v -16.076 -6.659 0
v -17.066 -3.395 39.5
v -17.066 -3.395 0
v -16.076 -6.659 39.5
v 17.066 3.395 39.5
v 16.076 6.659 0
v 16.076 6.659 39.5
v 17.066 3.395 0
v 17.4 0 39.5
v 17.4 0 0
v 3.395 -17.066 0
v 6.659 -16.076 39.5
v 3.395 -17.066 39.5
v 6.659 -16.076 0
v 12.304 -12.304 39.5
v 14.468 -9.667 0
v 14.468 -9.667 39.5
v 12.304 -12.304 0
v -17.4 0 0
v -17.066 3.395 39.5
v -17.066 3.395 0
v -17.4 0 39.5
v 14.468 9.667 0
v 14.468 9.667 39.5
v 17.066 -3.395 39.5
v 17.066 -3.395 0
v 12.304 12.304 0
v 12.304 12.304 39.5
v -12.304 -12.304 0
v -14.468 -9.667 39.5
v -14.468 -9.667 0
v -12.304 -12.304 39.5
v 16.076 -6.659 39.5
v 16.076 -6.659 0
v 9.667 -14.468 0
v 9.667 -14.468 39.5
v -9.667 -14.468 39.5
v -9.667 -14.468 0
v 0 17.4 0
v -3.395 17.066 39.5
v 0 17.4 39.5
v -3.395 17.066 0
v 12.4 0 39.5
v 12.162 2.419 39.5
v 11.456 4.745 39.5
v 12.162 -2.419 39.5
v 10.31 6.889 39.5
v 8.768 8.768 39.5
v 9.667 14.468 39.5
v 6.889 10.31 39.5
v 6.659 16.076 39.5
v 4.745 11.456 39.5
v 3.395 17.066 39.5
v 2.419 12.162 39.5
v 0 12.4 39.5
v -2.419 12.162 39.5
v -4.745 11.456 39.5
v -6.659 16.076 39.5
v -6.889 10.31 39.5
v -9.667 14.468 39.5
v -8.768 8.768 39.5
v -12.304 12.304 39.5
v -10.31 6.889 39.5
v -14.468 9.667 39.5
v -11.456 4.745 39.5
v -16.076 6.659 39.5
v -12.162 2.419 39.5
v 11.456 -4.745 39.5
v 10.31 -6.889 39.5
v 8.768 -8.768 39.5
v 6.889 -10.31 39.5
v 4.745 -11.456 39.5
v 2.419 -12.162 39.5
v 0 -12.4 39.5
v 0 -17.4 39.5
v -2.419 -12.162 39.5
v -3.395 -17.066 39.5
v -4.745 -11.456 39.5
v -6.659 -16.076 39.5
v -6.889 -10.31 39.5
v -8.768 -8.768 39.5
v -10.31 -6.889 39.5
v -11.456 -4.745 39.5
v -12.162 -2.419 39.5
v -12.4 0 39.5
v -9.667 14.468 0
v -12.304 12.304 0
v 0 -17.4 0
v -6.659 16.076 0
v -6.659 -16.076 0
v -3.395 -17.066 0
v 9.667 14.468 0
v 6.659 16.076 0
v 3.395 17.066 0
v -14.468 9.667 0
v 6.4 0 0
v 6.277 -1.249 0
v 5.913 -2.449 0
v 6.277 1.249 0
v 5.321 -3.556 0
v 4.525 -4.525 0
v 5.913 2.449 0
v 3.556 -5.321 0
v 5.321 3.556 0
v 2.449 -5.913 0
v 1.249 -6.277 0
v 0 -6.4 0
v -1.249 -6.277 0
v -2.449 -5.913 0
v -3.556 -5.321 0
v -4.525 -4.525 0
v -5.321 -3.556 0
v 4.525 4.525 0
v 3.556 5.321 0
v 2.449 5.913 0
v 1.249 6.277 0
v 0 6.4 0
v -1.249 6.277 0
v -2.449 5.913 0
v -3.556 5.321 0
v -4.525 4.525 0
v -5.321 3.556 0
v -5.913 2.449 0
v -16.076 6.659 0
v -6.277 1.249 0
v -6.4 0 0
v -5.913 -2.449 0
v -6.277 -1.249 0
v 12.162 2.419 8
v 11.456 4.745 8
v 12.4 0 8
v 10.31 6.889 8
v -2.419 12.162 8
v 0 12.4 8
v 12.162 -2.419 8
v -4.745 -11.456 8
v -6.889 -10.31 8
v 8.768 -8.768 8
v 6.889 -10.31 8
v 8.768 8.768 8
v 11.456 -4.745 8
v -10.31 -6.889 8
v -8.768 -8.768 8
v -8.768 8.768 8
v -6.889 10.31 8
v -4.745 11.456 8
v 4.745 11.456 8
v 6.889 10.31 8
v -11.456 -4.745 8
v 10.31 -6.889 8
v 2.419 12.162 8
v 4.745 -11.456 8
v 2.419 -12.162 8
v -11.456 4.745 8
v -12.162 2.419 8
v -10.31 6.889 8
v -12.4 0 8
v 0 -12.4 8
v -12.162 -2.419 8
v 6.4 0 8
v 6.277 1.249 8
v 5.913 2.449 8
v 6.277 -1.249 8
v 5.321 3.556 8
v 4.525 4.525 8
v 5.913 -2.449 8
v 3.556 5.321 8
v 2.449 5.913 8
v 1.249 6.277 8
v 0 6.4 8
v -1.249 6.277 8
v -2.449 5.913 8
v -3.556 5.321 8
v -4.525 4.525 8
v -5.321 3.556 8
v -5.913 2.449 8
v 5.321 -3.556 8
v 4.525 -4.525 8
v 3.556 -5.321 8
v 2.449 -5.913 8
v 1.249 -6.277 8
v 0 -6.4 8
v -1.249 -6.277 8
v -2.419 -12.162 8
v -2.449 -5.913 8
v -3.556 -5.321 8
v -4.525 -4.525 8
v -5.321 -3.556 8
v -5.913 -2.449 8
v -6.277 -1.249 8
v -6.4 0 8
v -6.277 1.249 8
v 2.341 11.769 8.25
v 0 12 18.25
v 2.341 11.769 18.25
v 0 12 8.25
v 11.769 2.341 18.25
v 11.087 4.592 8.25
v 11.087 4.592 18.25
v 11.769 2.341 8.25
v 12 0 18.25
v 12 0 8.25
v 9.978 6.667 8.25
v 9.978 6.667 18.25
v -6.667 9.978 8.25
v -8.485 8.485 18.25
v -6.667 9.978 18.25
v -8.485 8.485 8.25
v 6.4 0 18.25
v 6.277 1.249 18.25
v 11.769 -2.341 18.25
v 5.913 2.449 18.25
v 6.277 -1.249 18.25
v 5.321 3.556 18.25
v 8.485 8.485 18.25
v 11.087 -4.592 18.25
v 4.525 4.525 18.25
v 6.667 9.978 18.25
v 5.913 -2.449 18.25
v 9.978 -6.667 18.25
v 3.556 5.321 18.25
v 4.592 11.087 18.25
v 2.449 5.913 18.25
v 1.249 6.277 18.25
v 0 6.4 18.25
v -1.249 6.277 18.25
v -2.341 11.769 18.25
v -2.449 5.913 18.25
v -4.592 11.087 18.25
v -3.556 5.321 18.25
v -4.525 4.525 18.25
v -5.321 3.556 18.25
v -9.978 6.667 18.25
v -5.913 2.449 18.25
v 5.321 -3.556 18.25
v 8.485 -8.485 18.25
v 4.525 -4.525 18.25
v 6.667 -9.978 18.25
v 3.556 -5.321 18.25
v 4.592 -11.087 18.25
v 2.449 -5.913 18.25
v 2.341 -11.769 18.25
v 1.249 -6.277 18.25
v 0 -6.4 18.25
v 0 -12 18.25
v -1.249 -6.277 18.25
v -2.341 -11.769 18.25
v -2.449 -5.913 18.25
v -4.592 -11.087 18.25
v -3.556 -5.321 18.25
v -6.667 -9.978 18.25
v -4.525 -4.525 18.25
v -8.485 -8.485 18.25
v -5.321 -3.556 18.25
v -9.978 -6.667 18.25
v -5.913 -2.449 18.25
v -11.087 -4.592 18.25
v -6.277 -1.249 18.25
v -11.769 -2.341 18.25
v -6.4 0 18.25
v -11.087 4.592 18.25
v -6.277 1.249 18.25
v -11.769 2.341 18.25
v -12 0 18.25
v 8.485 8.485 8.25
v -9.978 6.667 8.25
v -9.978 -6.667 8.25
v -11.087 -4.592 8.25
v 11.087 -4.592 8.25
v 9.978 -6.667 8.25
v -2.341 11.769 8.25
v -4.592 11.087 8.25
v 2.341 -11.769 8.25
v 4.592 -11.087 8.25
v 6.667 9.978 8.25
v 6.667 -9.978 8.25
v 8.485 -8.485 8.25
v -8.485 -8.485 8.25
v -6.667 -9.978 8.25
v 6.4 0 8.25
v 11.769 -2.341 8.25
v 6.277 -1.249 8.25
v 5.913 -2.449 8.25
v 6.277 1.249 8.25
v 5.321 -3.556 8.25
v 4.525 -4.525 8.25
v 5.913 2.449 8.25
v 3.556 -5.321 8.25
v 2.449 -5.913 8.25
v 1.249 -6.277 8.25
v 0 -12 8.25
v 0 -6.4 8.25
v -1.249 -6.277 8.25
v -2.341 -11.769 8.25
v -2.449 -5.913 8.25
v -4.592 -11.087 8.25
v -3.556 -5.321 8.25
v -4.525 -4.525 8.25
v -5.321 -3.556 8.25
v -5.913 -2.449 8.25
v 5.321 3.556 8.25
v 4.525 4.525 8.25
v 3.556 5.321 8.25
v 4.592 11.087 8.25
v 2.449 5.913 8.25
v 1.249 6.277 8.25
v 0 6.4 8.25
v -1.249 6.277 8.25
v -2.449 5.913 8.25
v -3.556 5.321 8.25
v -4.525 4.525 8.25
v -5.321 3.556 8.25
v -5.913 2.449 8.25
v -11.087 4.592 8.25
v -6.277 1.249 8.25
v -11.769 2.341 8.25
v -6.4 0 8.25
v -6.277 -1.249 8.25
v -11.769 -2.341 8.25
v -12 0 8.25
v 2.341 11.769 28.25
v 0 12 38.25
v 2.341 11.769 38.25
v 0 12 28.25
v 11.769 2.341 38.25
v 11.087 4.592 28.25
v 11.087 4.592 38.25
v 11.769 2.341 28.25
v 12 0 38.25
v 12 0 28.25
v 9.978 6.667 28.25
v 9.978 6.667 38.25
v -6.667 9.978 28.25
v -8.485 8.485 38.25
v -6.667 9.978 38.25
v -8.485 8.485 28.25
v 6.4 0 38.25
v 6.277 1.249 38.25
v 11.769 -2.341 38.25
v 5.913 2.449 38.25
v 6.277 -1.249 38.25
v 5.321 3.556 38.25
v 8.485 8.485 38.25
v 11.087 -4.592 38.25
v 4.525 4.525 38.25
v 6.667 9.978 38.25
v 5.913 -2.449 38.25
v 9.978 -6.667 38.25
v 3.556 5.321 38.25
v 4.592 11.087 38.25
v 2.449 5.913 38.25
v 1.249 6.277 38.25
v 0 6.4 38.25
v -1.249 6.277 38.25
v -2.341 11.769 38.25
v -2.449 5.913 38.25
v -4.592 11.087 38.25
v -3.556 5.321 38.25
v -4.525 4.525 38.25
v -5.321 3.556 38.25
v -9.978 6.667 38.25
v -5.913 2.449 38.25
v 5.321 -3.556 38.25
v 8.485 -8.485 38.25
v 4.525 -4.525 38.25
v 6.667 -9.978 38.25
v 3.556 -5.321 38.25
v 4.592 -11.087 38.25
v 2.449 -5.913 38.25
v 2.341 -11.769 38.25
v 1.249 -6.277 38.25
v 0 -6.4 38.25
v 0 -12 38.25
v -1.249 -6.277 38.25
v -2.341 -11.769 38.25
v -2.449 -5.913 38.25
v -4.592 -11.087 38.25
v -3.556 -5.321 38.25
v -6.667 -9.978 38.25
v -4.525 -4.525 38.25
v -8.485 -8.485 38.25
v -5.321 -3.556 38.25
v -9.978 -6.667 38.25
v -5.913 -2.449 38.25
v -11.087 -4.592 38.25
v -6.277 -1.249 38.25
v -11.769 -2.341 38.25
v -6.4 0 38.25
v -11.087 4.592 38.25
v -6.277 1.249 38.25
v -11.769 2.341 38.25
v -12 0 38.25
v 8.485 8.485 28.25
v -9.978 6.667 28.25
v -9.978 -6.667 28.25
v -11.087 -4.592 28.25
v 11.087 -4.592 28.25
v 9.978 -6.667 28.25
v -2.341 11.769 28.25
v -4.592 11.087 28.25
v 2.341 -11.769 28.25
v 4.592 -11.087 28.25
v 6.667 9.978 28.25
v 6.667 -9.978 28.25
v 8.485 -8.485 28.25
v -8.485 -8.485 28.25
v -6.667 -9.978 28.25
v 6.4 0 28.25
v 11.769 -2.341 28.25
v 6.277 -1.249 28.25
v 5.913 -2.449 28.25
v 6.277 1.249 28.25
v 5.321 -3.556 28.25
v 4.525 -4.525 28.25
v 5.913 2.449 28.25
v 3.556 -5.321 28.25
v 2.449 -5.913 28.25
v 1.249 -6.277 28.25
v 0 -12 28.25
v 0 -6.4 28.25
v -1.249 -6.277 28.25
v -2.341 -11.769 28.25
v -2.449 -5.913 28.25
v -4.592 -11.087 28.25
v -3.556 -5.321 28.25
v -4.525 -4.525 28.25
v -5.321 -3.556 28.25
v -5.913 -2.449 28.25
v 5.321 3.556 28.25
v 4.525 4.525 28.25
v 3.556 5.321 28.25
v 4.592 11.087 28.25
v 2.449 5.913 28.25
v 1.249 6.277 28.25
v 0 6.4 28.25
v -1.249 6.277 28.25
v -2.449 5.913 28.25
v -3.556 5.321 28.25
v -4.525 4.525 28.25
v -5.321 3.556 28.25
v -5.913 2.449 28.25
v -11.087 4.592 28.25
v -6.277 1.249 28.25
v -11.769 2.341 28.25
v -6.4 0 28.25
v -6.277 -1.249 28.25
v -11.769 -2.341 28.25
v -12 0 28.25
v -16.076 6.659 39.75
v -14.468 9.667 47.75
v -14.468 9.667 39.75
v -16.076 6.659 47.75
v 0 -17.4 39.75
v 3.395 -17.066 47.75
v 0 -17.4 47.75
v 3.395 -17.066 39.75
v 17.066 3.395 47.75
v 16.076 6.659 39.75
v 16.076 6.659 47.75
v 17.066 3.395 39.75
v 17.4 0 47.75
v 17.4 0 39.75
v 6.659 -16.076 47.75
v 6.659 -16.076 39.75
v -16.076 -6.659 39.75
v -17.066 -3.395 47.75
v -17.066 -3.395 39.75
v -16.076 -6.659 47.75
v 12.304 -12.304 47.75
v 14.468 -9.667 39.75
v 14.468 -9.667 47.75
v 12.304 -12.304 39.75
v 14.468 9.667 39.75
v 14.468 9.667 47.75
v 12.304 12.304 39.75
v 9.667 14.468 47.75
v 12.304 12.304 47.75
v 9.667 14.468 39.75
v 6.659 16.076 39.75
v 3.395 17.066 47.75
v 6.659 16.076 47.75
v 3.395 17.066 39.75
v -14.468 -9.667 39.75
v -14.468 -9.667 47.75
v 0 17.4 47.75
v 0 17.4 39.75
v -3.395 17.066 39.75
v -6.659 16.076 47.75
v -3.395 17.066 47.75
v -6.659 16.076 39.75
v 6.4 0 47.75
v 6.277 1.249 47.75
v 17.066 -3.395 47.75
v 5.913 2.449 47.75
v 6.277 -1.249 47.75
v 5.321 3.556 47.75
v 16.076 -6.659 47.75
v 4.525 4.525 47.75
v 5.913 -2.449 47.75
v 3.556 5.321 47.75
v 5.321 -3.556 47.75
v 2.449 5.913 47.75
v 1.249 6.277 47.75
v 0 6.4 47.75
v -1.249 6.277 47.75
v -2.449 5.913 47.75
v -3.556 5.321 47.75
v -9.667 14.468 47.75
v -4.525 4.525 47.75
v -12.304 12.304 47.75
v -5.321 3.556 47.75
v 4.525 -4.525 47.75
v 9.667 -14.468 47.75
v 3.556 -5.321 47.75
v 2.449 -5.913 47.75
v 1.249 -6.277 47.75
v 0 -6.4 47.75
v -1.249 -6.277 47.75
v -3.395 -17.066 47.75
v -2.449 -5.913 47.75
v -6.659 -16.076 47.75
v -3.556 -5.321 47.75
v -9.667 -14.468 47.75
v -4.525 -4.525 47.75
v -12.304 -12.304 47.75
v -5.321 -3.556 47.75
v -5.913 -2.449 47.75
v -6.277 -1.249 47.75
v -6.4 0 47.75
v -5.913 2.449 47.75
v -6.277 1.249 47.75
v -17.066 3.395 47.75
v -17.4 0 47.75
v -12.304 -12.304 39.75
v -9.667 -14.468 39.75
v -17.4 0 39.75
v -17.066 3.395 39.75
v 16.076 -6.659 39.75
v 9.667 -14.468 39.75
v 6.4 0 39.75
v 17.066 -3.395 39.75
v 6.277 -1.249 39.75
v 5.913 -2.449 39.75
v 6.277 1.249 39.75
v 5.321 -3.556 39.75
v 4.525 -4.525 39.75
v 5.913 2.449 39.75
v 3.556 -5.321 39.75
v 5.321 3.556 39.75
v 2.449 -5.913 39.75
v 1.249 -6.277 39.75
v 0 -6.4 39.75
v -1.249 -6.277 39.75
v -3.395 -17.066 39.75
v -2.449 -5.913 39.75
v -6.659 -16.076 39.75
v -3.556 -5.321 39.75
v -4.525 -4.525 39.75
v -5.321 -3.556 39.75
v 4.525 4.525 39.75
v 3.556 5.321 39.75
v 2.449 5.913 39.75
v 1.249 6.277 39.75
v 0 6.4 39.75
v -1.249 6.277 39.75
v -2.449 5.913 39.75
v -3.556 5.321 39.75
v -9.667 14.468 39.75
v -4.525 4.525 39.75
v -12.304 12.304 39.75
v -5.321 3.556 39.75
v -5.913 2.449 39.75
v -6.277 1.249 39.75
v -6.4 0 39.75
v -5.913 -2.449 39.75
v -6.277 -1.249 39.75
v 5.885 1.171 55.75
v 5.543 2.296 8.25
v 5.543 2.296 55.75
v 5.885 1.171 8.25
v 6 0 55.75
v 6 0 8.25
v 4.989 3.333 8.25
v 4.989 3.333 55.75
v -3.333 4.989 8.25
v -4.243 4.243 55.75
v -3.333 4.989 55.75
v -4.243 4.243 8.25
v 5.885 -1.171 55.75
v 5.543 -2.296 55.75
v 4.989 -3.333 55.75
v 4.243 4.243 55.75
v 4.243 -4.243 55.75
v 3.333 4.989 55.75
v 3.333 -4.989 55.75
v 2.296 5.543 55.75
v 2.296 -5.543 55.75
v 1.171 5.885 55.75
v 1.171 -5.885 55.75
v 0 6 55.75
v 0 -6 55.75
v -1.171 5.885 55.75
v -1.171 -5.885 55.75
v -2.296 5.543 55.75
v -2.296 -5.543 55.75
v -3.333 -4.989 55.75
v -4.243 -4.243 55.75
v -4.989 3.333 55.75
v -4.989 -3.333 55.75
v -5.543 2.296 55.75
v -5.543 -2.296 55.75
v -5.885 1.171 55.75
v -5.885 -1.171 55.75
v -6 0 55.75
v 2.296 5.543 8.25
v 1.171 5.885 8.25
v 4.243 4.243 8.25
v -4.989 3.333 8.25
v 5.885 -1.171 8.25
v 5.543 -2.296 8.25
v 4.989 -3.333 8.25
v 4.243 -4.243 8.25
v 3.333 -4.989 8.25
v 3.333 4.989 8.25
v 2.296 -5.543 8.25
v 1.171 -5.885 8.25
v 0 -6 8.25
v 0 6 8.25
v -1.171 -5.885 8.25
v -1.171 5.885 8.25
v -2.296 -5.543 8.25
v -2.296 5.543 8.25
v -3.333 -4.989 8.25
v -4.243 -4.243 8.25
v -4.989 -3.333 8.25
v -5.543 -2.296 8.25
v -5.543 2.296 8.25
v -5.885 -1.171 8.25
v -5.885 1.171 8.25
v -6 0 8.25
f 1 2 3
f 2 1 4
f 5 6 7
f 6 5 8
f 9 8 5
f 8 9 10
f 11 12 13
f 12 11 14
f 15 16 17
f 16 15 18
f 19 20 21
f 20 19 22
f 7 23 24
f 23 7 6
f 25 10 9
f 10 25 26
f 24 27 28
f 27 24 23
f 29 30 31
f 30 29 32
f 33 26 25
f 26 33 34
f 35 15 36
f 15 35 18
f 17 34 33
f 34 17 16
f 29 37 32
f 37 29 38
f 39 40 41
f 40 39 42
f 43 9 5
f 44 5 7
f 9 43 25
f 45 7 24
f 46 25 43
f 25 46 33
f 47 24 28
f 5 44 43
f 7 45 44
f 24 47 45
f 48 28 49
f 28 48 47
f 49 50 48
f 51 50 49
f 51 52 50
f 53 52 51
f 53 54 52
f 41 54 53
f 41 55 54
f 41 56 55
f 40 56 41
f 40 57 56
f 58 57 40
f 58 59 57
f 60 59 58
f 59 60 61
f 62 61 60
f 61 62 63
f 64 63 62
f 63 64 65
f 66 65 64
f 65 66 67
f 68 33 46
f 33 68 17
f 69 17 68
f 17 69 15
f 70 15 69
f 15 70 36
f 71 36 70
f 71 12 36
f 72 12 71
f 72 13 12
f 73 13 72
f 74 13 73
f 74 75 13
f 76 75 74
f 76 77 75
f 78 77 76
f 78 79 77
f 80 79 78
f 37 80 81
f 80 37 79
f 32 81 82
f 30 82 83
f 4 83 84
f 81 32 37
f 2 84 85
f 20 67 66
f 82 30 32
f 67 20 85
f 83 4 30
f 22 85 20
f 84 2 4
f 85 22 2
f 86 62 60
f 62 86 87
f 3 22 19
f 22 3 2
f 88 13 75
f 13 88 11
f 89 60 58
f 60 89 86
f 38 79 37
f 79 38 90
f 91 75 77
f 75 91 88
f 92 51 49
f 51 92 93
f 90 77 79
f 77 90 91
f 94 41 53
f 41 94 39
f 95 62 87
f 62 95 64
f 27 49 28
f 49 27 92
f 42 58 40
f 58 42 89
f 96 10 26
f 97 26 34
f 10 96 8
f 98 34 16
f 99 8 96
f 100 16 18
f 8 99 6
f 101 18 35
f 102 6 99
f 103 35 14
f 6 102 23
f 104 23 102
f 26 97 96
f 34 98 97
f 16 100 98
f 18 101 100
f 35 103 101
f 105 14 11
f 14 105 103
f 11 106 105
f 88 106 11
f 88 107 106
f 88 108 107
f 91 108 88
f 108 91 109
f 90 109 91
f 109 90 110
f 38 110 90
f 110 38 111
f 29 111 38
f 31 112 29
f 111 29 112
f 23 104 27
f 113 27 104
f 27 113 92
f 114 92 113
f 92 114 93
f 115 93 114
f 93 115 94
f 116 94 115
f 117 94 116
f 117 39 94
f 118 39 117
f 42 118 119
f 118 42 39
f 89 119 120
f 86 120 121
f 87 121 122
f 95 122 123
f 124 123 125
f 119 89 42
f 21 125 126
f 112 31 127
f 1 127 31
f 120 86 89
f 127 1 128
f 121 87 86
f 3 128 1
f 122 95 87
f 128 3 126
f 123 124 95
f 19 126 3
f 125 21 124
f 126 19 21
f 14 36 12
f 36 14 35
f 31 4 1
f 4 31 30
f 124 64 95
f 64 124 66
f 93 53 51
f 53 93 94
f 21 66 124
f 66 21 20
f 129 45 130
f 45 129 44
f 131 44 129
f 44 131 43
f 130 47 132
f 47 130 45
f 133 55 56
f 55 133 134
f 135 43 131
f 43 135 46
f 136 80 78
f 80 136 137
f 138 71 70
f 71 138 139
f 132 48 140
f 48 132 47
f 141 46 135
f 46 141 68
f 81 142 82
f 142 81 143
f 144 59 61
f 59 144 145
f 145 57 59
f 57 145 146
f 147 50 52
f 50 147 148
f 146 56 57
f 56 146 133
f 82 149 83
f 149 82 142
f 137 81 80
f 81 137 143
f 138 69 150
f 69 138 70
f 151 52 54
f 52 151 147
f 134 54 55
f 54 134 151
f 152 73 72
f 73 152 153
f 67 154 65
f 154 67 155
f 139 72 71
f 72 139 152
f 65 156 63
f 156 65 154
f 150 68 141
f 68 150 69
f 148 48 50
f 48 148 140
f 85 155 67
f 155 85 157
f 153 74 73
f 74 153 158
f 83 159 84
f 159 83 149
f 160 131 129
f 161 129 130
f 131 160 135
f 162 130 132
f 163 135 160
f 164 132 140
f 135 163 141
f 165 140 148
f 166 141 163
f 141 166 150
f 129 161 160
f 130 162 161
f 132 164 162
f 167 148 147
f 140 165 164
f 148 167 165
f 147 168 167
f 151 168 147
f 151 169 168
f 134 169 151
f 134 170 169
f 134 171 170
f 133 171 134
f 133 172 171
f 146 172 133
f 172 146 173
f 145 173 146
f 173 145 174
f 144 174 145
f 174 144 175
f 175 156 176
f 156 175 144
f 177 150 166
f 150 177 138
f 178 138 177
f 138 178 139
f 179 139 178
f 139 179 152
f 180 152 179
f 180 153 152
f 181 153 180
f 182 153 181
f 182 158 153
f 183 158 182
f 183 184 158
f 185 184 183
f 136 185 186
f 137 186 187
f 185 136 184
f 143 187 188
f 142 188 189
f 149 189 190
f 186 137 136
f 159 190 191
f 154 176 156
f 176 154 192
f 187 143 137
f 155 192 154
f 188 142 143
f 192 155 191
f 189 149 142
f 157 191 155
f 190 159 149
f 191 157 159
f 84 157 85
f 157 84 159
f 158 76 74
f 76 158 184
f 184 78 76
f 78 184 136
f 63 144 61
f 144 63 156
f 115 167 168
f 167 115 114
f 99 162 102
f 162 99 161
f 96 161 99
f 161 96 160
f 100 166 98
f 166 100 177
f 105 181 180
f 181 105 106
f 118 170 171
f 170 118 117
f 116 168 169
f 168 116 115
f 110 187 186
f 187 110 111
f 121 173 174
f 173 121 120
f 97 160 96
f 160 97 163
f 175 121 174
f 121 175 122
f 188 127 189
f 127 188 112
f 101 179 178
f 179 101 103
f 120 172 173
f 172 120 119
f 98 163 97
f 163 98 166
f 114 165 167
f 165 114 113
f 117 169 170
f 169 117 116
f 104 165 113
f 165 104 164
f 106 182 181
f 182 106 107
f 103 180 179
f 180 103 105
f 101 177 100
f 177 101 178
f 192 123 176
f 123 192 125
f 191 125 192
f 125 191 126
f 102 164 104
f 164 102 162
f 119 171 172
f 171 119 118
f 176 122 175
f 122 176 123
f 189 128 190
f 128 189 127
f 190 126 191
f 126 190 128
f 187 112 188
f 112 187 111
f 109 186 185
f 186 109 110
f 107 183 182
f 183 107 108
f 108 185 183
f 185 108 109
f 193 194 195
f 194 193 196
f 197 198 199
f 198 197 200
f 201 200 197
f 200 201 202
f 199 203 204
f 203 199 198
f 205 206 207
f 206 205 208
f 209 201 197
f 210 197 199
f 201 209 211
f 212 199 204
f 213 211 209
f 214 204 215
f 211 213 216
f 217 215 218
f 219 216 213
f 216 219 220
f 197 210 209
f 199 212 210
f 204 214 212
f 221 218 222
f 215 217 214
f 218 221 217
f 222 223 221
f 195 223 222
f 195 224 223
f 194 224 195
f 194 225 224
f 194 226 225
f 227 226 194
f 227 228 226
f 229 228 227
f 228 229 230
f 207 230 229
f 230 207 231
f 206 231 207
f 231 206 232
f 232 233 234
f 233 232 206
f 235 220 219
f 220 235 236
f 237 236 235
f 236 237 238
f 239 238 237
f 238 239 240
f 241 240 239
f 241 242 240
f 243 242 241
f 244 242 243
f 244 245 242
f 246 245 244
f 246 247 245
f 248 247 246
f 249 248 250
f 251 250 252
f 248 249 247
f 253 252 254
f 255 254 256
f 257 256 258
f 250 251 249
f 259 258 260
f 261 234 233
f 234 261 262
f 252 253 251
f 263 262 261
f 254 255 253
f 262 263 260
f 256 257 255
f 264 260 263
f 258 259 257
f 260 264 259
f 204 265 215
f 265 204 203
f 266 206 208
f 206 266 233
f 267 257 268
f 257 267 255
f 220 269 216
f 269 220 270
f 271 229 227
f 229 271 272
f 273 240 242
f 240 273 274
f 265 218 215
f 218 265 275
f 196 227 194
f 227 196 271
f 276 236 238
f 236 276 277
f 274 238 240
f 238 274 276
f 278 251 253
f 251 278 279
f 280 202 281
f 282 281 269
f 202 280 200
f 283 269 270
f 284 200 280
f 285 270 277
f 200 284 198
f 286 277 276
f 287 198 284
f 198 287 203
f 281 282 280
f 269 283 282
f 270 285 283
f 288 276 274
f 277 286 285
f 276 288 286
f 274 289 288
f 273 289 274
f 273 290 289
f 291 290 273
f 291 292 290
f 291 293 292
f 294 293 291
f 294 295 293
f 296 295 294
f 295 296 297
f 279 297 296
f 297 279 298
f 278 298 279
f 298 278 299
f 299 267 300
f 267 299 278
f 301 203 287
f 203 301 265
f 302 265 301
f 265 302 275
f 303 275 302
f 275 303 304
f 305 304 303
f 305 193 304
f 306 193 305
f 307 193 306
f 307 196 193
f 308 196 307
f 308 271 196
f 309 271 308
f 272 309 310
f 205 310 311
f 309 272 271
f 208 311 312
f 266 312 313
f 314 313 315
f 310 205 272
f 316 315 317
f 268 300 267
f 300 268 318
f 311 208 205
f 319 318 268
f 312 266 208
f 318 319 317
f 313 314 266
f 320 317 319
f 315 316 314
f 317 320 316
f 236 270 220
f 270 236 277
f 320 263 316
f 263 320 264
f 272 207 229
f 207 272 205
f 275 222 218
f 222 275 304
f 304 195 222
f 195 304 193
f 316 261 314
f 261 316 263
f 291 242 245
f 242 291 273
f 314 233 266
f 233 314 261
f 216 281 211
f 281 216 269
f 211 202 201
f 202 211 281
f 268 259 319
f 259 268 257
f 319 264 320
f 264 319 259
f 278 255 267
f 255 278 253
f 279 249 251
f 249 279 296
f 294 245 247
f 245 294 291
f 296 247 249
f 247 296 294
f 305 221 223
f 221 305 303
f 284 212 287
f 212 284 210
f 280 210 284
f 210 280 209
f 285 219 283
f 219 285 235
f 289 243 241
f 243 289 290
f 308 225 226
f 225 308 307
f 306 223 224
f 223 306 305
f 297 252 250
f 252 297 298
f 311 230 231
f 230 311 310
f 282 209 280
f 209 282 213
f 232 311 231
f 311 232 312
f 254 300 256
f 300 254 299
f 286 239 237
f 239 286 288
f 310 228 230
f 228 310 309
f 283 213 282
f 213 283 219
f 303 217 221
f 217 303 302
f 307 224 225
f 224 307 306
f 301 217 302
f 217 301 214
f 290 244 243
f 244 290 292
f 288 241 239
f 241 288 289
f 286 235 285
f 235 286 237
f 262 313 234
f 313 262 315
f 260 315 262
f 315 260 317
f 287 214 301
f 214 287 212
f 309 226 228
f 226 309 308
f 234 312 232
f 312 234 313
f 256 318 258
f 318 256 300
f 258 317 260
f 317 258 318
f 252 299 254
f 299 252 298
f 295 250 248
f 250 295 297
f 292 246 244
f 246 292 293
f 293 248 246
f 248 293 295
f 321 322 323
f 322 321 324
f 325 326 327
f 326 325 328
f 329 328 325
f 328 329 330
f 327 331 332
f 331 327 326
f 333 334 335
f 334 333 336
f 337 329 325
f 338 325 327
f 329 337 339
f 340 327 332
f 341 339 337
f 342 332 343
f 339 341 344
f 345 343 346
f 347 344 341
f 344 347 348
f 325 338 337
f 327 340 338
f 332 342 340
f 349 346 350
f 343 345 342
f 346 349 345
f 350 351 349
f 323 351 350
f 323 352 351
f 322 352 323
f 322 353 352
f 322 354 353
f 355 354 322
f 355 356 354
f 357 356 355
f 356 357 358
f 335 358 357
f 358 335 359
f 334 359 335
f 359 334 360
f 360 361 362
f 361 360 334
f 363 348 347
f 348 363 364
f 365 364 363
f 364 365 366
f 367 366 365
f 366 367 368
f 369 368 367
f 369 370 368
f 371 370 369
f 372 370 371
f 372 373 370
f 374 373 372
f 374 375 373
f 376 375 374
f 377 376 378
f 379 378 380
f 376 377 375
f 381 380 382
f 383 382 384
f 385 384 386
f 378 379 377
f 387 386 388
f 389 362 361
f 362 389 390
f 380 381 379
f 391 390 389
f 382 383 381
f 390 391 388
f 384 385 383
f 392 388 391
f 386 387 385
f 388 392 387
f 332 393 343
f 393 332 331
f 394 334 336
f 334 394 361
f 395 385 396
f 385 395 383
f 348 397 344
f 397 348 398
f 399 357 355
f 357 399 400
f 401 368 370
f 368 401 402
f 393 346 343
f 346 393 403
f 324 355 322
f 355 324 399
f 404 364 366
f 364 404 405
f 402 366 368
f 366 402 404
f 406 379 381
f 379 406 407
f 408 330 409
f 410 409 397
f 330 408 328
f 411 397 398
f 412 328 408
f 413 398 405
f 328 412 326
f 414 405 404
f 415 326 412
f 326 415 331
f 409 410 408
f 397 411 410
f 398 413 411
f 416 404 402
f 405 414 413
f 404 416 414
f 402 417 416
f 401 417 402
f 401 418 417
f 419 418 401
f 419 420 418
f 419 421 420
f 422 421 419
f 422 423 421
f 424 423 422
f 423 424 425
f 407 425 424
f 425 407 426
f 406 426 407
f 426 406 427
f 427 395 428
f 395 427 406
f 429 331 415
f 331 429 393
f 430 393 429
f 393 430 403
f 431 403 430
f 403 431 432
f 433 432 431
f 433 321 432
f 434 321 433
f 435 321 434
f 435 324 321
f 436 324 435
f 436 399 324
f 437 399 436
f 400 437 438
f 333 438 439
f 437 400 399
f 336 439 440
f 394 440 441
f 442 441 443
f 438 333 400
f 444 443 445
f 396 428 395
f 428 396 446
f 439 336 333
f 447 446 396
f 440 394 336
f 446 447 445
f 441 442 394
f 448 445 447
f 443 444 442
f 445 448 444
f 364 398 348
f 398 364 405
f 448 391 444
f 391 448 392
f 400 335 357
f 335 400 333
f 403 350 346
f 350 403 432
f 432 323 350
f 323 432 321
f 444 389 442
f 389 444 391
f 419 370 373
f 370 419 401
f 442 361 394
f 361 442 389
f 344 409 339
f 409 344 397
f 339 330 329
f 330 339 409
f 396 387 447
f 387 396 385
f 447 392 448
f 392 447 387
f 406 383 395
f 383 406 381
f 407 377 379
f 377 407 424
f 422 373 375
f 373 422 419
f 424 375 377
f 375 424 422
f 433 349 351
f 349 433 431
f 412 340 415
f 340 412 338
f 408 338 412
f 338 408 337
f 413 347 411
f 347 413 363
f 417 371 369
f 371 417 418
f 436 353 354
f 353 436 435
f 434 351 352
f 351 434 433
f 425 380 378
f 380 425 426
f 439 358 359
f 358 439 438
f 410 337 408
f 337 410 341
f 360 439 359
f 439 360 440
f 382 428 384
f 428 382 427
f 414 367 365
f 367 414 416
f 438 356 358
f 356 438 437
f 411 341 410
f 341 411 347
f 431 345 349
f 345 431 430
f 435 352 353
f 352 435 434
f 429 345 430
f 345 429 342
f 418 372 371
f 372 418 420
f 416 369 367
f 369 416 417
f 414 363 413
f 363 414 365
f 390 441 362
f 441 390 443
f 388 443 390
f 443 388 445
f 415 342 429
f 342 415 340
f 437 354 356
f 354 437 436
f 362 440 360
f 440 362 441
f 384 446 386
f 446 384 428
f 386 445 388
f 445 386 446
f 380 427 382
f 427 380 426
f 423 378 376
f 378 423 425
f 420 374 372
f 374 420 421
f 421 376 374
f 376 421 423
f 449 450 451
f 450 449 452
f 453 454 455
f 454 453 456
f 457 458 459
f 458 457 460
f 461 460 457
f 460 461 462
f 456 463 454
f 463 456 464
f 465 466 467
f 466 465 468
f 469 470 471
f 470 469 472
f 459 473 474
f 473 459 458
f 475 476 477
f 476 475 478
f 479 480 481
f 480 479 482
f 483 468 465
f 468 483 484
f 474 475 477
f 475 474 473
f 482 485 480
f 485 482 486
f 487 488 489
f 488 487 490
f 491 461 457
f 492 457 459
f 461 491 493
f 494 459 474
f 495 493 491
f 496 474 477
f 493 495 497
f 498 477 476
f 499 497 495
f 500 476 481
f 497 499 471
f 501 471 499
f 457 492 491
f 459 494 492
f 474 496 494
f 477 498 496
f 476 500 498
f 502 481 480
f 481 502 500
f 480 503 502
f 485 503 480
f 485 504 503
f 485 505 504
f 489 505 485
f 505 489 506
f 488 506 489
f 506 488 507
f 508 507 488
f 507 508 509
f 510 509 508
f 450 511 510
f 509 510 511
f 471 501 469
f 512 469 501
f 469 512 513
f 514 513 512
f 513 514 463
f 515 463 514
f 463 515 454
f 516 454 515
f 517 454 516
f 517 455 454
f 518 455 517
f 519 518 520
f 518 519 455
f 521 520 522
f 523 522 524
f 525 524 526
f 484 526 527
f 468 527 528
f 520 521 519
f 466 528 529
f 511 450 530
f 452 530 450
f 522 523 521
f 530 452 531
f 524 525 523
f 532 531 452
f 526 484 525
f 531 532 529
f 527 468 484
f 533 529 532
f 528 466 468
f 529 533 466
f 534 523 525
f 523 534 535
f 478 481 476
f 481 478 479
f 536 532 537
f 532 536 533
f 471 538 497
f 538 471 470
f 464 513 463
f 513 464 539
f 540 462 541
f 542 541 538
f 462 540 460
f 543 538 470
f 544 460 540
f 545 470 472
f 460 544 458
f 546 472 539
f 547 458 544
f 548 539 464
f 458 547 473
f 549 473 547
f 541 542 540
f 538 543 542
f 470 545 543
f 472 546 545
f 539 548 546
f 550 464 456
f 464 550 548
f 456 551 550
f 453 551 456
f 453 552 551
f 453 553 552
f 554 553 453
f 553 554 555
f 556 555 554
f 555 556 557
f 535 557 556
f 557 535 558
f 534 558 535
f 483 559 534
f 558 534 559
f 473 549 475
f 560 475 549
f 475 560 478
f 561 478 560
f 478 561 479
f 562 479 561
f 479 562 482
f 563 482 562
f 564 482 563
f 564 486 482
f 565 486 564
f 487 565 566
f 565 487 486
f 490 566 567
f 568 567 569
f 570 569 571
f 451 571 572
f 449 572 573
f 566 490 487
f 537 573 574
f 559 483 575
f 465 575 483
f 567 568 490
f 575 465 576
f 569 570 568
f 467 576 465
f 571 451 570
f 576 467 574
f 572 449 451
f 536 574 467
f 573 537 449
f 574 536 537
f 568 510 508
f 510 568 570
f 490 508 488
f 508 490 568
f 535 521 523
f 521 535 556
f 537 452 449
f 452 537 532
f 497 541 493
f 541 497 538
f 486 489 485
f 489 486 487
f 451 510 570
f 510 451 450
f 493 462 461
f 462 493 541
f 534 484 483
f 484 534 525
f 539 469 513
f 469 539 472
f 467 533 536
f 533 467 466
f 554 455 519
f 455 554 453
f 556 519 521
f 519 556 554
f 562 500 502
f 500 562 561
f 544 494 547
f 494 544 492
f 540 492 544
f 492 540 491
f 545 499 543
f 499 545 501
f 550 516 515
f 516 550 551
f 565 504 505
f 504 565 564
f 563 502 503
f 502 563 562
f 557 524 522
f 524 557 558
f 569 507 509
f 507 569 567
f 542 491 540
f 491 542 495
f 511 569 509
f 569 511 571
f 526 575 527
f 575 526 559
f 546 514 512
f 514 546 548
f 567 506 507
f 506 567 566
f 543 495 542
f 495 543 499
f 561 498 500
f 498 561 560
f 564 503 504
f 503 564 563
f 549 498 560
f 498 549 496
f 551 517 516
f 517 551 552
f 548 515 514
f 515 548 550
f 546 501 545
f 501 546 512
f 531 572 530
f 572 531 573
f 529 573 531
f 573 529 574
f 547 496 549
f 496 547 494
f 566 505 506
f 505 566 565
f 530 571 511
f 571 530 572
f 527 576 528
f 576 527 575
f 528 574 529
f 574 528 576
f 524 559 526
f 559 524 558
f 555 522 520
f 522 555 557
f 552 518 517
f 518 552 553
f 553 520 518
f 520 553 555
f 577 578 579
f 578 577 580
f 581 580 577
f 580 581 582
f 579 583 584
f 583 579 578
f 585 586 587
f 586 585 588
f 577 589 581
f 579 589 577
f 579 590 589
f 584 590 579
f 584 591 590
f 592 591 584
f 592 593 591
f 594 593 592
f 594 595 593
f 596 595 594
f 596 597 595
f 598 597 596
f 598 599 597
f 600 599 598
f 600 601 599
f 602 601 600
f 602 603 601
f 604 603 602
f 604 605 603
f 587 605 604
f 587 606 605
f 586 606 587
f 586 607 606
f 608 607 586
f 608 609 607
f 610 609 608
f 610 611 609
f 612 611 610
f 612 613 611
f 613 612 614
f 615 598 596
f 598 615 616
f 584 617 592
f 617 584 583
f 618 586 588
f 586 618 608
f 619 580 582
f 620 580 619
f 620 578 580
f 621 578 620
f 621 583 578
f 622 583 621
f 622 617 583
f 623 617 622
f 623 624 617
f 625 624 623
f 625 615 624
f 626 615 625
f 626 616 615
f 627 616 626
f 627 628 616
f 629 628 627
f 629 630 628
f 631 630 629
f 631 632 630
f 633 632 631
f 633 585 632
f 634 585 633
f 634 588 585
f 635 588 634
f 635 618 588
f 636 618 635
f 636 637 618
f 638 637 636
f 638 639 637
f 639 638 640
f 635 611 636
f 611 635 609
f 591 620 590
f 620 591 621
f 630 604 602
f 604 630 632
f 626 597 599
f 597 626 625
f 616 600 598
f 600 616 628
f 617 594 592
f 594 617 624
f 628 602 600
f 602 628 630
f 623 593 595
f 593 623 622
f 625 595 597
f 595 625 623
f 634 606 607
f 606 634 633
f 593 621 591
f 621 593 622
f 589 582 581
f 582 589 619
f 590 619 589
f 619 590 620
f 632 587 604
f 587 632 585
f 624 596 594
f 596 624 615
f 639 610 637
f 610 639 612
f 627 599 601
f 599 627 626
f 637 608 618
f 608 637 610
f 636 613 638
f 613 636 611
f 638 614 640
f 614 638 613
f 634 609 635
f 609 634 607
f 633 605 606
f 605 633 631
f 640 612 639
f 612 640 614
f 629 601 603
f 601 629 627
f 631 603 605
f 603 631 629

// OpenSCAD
$fn = 32;

// ------------------------------------------------------------------------
// Shaft station: cup d34.8 x 39.5 mm, shaft d12
// Every part is its own module, assembly() places every instance.
// ------------------------------------------------------------------------

// --- part 1 ---
module housing_cup() {
  difference() {
    cylinder(h = 39.5, d = 34.8);
    translate([0, 0, 8]) cylinder(h = 32.5, d = 24.8);
    translate([0, 0, -1]) cylinder(h = 10, d = 12.8);
  }
}

// --- part 2 ---
module bearing_lower() {
  difference() {
      translate([0, 0, 0]) cylinder(h = 10, d = 24);
      translate([0, 0, -1]) cylinder(h = 12, d = 12.8);
    }
}

// --- part 3 ---
module bearing_upper() {
  difference() {
      translate([0, 0, 0]) cylinder(h = 10, d = 24);
      translate([0, 0, -1]) cylinder(h = 12, d = 12.8);
    }
}

// --- part 4 ---
module station_shaft() {
  translate([0, 0, -23.75]) cylinder(h = 47.5, d = 12);
}

// --- part 5 ---
module station_cover() {
  difference() {
    cylinder(h = 8, d = 34.8);
    translate([0, 0, -1]) cylinder(h = 10, d = 12.8);
  }
}

// --- assembly ---
module assembly() {
  color([0.80, 0.24, 0.20]) translate([0, 0, 0]) rotate([0, 0, 0]) housing_cup();
  color([0.20, 0.45, 0.75]) translate([0, 0, 8.25]) rotate([0, 0, 0]) bearing_lower();
  color([0.25, 0.62, 0.32]) translate([0, 0, 28.25]) rotate([0, 0, 0]) bearing_upper();
  color([0.92, 0.70, 0.18]) translate([0, 0, 32]) rotate([0, 0, 0]) station_shaft();
  color([0.58, 0.35, 0.70]) translate([0, 0, 39.75]) rotate([0, 0, 0]) station_cover();
}

assembly();
